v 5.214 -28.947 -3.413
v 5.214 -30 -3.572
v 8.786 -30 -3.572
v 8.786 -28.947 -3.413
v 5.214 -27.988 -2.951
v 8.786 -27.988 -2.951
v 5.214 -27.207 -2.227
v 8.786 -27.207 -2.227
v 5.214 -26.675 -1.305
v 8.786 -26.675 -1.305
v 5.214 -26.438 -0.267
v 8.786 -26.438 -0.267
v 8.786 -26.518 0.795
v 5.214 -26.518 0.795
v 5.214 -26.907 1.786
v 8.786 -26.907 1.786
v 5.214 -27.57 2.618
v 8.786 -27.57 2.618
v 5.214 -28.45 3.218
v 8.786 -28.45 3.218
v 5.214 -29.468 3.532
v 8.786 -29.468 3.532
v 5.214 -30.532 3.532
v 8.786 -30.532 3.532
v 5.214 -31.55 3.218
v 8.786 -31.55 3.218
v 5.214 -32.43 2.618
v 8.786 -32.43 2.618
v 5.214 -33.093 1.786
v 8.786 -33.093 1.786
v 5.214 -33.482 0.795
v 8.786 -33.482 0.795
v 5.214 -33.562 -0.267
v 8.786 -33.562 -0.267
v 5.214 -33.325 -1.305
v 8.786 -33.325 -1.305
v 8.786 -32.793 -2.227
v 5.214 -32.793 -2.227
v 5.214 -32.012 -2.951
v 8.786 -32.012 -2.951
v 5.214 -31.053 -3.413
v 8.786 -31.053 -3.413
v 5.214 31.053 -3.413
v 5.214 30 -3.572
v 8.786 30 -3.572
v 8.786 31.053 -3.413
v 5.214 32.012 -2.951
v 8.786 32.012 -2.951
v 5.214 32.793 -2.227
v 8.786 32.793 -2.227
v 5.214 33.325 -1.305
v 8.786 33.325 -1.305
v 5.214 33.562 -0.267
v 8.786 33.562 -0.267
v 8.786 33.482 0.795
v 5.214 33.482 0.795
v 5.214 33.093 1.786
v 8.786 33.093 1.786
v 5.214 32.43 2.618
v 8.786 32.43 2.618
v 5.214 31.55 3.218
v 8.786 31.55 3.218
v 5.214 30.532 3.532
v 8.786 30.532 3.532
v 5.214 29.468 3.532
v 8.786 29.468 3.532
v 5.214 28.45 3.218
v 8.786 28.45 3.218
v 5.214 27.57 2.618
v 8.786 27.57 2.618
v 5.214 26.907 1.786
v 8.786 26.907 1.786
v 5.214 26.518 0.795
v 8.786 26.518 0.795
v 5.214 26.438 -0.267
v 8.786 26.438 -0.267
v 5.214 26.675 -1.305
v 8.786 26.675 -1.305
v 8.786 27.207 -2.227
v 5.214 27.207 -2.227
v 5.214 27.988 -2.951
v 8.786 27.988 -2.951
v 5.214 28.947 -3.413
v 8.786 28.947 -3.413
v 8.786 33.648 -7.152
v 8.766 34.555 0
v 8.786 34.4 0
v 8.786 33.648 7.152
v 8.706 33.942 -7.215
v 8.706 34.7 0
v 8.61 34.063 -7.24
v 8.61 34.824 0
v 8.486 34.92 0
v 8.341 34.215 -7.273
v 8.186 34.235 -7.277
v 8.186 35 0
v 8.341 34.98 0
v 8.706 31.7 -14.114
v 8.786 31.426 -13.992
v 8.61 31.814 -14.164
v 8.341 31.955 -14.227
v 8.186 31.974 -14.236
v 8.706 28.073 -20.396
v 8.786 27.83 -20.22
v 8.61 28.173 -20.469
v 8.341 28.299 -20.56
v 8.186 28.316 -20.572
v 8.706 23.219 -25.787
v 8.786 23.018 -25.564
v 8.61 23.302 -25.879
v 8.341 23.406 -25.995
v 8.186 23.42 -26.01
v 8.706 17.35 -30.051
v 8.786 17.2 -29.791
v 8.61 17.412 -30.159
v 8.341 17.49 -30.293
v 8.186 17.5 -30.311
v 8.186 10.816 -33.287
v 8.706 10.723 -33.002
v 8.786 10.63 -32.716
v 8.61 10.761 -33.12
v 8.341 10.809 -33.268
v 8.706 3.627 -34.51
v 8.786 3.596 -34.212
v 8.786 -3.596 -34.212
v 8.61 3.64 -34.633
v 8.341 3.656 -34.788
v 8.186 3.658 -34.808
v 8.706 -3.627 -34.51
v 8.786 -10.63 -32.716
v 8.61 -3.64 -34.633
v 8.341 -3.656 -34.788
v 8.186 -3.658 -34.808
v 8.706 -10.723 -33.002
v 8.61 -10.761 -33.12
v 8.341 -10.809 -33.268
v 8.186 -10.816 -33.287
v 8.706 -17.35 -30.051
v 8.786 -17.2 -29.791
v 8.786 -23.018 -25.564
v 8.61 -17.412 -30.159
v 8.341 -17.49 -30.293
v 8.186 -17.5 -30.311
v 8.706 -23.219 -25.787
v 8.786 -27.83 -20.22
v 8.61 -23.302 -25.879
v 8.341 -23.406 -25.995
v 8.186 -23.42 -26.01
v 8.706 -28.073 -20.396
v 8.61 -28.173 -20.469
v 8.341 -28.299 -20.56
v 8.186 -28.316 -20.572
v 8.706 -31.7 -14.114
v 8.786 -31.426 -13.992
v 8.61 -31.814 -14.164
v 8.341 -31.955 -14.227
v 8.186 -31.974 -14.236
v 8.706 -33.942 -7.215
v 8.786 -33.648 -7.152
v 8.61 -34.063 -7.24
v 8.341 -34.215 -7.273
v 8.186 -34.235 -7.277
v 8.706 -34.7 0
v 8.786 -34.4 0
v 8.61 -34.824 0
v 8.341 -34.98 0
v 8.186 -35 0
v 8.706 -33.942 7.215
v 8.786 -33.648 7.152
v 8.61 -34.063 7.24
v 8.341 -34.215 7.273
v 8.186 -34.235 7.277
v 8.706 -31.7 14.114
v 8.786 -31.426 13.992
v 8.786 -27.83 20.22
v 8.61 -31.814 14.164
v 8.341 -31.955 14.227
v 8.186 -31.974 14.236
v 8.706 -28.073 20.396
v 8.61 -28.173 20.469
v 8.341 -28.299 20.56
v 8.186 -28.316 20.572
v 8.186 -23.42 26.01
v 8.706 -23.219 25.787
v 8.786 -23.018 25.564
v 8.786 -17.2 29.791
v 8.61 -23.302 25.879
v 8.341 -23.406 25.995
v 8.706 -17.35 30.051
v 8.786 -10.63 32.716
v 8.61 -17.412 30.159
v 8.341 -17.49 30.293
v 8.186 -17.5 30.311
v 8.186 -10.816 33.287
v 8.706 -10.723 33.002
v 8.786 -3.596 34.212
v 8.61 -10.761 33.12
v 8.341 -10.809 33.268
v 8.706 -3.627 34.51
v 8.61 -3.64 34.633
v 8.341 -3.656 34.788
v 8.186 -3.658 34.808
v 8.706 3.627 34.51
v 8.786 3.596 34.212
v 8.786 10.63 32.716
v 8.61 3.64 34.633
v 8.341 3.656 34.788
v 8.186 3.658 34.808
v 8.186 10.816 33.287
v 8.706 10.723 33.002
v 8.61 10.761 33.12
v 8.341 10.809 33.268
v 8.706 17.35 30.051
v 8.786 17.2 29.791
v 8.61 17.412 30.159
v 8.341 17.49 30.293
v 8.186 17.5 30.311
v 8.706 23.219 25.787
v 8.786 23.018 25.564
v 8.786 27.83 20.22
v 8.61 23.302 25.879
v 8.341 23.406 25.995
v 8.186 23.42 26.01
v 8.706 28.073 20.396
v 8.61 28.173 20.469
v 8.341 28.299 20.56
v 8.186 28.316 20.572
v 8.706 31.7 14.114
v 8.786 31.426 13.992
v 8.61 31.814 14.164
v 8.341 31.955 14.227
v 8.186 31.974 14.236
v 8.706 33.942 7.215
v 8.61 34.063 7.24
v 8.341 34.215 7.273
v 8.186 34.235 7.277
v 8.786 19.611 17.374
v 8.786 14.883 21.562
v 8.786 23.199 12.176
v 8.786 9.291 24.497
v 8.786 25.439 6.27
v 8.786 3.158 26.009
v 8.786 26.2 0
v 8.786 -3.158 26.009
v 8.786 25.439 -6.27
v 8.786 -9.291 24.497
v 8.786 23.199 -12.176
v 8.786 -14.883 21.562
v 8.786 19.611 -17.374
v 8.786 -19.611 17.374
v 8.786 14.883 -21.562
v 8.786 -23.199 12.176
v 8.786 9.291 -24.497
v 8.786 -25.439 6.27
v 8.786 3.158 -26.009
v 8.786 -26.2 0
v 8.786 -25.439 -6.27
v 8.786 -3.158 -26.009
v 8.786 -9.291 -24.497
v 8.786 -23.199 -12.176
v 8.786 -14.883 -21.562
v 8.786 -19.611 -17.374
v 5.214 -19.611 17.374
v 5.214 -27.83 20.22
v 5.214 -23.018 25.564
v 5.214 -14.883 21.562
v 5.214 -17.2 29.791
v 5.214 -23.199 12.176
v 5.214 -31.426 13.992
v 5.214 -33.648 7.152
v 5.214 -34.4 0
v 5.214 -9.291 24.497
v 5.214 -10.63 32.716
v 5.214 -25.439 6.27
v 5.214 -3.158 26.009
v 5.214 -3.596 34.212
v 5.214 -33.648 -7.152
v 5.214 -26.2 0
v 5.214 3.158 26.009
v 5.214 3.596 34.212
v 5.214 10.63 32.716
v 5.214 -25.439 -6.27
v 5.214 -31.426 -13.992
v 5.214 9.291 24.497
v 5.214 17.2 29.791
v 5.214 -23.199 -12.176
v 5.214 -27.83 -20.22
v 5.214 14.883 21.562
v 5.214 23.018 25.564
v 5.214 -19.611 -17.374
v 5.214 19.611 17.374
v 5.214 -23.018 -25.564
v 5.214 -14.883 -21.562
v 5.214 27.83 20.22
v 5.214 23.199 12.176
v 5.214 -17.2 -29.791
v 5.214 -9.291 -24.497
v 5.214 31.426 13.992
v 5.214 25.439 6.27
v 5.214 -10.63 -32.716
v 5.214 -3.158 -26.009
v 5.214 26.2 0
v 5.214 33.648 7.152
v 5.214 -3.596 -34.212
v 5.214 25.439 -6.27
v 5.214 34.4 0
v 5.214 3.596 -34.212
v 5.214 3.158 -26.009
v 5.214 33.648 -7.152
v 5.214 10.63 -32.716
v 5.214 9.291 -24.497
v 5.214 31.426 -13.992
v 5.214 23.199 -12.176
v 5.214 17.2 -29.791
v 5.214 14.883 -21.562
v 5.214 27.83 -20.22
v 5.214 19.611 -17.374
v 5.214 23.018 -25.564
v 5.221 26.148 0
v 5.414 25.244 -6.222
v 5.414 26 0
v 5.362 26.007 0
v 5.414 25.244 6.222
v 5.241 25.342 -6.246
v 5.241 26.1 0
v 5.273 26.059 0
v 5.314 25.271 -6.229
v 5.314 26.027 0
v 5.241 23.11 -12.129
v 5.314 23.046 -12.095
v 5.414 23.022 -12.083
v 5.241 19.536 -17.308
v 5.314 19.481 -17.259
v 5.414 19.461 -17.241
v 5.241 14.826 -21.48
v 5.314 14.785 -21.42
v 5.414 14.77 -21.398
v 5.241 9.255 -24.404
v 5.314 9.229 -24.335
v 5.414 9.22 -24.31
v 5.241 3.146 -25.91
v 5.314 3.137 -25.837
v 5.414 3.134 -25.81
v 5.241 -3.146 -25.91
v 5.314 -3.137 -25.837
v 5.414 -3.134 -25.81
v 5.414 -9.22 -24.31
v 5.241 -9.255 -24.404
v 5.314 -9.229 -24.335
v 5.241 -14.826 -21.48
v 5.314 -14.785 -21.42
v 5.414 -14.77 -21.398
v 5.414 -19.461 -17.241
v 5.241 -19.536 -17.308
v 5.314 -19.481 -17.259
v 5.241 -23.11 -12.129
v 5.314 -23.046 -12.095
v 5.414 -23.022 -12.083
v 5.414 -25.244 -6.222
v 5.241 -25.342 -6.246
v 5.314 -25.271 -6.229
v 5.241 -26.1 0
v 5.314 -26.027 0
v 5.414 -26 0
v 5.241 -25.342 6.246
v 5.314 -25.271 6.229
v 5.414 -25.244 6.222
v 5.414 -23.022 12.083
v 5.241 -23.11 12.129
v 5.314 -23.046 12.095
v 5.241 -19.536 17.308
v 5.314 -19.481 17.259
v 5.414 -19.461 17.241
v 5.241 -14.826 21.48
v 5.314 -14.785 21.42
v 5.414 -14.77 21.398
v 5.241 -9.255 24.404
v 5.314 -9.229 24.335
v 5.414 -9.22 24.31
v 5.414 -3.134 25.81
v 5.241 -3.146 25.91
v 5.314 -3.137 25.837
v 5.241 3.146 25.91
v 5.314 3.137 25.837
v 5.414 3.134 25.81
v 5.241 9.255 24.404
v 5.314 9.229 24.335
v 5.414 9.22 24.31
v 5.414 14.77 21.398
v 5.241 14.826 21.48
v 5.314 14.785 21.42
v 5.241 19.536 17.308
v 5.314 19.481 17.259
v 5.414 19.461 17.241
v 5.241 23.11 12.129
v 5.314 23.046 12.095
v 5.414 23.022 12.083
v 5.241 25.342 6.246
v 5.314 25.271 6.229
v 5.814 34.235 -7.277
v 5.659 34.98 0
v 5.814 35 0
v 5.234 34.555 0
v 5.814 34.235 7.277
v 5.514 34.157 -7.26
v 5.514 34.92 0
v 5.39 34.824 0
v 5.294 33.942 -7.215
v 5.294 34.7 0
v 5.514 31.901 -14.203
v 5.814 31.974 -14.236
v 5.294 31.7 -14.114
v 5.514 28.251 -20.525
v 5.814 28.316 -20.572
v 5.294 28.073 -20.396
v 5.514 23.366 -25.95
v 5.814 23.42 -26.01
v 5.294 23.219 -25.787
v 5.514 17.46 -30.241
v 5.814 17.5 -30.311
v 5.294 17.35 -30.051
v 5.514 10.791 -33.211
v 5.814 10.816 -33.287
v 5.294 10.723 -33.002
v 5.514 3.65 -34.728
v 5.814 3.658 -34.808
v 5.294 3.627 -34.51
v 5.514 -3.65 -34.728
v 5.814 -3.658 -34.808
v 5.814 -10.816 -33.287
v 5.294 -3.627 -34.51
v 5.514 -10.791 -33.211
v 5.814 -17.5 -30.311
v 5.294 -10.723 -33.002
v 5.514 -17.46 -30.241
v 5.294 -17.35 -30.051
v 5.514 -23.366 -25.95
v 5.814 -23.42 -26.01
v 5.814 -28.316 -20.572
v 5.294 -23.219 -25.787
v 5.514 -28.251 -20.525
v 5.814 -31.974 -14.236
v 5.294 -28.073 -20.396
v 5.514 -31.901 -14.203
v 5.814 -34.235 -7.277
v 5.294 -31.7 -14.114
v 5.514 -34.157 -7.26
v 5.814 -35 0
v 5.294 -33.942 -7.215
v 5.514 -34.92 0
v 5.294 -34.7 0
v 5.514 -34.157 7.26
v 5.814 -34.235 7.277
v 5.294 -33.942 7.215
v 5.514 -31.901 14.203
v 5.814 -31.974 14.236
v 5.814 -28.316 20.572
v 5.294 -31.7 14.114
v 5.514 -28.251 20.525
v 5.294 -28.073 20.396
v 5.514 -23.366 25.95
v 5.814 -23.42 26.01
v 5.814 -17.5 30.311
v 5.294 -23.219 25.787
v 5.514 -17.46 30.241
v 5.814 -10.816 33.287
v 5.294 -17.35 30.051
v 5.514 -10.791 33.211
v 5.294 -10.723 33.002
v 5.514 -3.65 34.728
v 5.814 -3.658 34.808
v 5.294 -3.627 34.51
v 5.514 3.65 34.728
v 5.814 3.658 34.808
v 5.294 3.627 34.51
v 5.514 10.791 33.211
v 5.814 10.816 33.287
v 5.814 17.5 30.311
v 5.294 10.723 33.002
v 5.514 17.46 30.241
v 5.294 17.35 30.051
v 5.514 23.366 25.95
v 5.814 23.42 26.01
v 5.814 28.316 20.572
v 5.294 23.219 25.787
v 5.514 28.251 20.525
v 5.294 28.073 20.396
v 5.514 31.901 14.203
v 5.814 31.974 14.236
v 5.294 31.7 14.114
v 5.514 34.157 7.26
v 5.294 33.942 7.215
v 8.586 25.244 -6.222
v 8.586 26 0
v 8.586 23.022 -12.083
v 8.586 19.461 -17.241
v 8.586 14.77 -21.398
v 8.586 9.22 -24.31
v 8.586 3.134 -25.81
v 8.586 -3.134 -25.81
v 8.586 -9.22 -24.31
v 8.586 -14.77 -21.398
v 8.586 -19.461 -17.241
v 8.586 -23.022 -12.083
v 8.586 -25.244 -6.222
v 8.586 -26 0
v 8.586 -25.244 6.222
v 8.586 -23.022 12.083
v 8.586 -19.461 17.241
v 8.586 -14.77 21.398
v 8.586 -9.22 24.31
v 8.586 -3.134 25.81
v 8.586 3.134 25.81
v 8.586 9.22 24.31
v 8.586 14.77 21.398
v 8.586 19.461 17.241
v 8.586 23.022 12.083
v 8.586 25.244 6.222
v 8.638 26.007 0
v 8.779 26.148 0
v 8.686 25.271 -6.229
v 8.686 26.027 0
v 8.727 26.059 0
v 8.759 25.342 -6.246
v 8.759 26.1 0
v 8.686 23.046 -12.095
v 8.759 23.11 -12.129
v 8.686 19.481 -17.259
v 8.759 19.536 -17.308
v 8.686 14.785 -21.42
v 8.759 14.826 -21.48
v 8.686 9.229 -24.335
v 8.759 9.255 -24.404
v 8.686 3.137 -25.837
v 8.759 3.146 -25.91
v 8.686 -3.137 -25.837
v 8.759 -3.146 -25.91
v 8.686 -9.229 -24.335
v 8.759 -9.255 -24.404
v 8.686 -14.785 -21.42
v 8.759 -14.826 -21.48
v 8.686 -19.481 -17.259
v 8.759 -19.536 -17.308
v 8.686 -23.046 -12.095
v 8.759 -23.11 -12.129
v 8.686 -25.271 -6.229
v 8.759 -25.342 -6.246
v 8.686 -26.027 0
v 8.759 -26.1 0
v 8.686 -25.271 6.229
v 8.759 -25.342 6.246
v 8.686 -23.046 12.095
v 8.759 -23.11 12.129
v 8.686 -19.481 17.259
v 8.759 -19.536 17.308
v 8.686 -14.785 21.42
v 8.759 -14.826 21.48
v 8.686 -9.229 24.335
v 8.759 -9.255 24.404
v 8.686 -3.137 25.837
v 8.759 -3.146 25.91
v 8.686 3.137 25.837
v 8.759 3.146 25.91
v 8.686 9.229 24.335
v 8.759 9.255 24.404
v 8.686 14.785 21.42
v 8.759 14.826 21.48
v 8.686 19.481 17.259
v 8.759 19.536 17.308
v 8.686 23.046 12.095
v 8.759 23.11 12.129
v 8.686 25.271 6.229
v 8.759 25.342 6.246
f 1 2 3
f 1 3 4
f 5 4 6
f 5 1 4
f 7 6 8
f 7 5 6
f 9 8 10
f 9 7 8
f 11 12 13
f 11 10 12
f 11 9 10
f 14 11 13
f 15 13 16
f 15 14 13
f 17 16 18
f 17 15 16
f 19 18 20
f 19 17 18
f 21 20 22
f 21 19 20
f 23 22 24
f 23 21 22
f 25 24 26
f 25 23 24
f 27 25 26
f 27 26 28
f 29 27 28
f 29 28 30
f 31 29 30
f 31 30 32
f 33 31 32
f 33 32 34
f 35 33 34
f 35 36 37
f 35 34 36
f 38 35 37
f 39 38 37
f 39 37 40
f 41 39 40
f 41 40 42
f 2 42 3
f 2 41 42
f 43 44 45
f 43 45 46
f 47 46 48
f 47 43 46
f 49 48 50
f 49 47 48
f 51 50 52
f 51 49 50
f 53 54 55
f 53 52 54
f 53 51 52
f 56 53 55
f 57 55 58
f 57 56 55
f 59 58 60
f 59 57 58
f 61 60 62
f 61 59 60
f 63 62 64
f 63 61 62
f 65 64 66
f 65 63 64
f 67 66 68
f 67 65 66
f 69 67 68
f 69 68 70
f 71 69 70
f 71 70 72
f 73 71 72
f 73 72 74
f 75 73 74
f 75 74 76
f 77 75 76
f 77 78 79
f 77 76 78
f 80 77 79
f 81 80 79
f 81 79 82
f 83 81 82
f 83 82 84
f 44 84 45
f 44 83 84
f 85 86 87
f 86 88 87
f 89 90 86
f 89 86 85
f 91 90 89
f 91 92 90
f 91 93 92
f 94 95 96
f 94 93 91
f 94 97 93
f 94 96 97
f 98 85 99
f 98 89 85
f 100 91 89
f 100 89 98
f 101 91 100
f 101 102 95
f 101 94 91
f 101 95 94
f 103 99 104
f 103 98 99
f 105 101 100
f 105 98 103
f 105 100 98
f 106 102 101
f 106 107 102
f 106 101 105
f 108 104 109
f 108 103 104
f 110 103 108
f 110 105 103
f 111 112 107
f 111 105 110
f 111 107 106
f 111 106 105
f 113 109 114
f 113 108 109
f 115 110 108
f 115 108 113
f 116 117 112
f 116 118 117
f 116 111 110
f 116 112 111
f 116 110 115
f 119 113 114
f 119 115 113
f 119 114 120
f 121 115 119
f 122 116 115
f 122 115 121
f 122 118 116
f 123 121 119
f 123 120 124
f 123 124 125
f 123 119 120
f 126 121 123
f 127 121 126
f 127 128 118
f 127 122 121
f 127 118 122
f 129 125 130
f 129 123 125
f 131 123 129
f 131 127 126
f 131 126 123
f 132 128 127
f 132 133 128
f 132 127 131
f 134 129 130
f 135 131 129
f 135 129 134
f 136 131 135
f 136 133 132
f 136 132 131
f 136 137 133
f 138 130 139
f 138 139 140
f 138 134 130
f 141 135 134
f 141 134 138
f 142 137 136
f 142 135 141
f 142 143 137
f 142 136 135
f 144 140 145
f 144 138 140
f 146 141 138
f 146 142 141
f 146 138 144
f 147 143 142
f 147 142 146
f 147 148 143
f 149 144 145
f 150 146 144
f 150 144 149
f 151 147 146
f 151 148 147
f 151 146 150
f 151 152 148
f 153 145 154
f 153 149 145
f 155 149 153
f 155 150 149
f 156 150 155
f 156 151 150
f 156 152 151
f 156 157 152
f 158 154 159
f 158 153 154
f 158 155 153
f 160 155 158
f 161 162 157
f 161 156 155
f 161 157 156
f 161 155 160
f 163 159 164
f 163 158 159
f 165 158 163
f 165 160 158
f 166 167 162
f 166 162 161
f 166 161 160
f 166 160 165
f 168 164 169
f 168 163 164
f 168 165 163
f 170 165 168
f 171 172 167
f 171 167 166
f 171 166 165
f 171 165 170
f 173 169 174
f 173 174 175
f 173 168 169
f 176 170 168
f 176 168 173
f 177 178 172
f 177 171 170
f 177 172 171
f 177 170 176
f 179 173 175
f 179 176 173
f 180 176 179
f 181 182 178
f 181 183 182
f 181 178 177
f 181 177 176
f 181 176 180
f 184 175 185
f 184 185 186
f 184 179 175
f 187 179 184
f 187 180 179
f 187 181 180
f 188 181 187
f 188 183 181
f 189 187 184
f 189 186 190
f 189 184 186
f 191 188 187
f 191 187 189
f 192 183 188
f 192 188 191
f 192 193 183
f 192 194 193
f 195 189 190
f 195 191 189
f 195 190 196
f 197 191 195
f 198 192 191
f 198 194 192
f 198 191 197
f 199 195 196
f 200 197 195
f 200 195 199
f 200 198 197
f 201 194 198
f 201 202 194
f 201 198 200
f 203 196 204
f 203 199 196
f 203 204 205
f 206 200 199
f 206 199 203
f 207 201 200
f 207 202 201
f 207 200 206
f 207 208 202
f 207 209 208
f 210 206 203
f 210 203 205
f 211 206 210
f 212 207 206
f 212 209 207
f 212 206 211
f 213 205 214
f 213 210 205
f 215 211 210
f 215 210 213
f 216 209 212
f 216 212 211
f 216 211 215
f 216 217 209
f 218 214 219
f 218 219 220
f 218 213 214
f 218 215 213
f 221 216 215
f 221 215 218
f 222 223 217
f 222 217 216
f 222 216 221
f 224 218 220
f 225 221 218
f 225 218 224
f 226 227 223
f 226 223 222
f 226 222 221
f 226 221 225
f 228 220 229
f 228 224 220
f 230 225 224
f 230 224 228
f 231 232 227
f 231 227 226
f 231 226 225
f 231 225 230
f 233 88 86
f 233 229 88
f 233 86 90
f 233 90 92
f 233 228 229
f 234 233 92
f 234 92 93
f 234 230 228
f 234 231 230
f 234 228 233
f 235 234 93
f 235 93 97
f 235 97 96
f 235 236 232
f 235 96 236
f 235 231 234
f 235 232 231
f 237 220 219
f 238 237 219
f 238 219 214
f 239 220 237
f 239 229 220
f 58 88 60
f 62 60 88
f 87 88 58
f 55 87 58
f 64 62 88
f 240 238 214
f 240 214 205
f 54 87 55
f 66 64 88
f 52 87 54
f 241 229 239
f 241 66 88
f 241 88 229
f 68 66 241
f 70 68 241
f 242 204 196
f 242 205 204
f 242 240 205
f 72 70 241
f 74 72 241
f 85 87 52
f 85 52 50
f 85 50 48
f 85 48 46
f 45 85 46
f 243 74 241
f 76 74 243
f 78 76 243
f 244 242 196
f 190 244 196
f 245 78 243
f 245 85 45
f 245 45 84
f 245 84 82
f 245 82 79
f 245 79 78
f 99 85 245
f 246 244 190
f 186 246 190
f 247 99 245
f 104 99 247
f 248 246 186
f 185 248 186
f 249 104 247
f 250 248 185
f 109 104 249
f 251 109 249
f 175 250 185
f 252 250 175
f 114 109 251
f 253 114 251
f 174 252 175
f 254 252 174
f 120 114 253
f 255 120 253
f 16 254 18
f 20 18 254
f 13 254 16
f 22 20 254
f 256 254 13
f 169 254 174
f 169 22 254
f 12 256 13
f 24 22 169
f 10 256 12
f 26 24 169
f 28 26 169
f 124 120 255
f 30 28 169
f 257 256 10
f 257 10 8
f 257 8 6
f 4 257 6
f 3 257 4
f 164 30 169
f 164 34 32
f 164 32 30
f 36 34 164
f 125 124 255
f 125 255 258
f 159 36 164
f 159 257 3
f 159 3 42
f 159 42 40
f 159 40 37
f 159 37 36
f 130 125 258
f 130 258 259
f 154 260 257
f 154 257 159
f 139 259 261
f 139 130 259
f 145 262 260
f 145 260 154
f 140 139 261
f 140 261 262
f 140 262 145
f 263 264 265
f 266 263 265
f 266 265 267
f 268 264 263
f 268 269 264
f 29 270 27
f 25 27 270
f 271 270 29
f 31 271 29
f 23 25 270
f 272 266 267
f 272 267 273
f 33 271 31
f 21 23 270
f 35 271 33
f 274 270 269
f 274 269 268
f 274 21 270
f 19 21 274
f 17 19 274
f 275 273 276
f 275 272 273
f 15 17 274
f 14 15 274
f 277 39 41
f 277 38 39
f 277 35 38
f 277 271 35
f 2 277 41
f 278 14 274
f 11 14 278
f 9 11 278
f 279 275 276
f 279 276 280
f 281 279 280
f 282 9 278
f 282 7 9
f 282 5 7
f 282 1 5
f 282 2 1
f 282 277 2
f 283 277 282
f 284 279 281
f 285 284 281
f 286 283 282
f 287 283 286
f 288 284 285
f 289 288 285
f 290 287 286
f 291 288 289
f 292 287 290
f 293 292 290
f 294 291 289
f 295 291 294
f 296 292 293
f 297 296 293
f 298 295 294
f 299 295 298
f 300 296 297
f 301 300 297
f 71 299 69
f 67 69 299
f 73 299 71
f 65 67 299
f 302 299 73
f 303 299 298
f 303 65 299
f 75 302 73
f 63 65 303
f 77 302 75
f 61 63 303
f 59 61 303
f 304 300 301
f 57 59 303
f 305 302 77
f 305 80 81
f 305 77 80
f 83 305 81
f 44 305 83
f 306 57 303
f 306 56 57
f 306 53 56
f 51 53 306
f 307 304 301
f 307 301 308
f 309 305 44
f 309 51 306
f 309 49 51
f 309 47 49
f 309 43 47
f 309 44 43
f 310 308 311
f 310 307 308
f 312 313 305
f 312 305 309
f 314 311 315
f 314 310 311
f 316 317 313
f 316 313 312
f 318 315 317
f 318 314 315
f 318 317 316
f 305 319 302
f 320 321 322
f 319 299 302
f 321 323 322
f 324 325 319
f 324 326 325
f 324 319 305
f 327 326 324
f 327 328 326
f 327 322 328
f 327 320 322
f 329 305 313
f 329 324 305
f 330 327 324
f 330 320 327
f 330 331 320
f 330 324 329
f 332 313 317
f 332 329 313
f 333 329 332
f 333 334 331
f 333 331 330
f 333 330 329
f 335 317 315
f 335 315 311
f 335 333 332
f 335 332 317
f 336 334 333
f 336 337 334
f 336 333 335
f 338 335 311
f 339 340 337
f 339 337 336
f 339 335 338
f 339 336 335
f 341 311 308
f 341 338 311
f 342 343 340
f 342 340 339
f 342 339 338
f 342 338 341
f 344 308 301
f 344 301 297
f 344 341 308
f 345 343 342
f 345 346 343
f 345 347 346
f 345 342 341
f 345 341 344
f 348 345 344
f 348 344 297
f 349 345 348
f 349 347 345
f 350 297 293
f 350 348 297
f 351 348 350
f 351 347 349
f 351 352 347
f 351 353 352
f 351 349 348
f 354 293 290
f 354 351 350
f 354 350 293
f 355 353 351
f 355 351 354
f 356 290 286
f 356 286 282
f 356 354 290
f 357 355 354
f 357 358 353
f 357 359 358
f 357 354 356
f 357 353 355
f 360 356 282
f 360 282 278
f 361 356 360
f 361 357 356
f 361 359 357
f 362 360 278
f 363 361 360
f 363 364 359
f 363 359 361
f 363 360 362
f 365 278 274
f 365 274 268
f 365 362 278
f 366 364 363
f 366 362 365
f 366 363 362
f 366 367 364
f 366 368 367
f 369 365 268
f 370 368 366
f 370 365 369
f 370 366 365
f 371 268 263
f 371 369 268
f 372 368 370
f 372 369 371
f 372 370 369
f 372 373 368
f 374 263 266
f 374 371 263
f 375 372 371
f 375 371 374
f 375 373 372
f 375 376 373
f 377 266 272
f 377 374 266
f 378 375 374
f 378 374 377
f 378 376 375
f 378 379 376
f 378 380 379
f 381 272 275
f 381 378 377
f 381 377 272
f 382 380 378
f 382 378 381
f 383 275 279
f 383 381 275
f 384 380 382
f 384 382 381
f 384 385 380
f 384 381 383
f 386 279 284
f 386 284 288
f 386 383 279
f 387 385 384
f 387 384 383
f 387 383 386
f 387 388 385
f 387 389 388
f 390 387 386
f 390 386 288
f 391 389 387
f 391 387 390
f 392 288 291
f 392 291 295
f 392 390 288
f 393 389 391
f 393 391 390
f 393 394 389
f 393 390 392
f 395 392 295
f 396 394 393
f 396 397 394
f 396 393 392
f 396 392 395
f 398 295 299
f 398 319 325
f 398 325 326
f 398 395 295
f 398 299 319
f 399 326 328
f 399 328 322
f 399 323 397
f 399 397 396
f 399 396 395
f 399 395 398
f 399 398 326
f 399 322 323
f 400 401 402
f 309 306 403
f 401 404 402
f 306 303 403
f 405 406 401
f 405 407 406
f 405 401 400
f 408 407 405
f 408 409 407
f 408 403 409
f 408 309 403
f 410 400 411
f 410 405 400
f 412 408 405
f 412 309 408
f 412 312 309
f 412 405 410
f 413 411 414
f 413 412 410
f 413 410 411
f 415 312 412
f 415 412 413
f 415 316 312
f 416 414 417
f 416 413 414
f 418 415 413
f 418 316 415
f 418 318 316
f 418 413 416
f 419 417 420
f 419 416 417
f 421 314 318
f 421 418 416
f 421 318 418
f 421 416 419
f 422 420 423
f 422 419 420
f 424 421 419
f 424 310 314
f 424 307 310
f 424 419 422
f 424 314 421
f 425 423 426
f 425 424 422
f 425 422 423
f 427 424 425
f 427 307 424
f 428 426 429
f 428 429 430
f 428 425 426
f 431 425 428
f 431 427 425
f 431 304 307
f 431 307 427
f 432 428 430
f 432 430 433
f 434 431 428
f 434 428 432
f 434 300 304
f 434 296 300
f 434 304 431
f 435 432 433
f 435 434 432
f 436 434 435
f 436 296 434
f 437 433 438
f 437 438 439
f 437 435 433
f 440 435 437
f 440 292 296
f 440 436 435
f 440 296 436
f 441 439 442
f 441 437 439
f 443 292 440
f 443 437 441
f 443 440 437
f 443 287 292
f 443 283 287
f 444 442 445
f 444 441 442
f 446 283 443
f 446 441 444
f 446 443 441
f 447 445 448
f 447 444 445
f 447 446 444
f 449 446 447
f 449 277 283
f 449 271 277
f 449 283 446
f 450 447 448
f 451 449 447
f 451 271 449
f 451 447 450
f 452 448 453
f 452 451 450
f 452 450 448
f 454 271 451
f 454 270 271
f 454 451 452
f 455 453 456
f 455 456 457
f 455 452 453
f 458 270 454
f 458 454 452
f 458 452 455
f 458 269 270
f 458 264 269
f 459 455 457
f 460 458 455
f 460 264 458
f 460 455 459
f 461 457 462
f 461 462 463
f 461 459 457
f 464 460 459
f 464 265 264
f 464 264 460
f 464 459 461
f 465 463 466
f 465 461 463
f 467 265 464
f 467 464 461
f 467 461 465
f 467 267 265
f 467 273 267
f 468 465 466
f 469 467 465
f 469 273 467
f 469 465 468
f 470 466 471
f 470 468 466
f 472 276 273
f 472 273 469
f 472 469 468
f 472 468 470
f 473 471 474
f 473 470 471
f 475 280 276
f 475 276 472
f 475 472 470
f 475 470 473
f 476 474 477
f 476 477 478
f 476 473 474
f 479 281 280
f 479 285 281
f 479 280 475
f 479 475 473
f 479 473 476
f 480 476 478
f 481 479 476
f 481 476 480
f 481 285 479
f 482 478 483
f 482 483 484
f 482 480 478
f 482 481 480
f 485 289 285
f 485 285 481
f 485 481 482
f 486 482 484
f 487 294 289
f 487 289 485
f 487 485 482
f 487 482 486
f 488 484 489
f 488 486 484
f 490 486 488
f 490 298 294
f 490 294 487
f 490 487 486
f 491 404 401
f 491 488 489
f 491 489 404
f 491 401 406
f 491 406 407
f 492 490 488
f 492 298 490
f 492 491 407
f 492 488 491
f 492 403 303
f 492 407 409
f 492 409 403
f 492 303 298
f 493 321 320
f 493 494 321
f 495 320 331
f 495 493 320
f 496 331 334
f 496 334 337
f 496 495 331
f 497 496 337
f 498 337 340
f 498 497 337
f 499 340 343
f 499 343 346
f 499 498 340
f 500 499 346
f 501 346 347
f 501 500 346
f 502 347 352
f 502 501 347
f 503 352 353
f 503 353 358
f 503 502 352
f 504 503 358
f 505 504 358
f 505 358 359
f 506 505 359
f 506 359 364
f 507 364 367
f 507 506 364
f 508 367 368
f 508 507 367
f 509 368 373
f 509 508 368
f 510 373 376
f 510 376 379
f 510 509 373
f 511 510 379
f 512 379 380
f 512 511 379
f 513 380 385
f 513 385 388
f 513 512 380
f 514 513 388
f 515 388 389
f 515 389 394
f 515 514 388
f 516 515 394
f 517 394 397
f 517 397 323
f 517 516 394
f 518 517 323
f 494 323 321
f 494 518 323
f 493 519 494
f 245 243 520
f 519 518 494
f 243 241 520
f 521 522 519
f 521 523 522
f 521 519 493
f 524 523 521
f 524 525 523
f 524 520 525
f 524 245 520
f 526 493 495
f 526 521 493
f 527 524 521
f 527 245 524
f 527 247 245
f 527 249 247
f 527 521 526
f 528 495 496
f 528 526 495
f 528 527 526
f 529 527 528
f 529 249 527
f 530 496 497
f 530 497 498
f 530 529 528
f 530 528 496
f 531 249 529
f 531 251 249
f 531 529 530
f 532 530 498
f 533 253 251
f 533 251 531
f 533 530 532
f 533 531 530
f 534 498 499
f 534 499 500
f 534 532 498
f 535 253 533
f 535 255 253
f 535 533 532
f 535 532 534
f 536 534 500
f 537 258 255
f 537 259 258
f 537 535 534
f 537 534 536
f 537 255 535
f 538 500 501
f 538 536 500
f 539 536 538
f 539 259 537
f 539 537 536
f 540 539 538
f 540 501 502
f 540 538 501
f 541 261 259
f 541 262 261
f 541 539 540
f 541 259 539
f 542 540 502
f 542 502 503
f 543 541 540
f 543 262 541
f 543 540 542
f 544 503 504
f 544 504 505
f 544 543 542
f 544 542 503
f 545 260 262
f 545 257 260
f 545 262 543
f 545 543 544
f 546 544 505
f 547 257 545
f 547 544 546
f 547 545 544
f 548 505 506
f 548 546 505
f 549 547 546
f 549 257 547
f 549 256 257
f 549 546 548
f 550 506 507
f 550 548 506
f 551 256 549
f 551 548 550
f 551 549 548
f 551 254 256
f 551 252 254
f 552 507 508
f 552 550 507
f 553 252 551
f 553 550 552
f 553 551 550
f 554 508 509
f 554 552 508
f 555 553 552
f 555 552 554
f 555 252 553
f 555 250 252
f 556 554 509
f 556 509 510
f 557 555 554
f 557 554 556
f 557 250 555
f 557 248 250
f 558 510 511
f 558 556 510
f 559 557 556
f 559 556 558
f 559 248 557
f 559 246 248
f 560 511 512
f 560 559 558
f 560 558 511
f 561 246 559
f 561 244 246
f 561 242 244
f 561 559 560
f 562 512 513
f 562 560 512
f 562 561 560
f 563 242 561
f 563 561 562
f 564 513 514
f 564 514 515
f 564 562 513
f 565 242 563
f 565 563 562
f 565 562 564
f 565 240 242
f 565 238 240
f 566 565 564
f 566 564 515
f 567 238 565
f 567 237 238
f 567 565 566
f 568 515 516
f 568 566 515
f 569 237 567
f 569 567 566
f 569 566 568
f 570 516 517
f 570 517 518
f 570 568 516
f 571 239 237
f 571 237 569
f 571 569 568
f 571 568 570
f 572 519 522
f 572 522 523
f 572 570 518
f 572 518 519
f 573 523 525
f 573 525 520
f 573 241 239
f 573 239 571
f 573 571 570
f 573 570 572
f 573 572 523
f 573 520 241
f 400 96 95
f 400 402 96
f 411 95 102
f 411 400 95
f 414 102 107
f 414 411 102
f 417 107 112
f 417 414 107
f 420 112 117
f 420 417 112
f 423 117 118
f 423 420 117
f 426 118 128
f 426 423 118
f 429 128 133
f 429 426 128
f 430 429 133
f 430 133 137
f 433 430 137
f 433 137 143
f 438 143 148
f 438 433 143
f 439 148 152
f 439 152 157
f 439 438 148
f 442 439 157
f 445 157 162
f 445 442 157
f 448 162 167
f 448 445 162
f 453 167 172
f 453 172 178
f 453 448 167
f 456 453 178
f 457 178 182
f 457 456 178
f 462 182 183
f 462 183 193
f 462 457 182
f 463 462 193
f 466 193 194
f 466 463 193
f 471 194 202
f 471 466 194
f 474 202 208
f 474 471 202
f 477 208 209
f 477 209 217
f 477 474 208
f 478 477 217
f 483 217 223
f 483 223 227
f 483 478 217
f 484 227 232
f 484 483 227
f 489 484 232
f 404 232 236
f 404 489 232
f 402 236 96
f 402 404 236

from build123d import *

# Parameters (mm, degrees)
CROQUIS2_R     = 3.572
EXTRUIR1_DEPTH = 12.358
CROQUIS3_R     = 3.572
EXTRUIR2_DEPTH = 12.358


with BuildPart() as part:
    # Croquis1 → Revolución1 (revolve)
    with BuildSketch(Plane.XY):
        with BuildLine():
            Line((5.214, 34.4), (5.214, 26.2))
            ThreePointArc((5.214, 26.2), (5.272578644, 26.058578644), (5.414, 26))
            Line((5.414, 26), (8.586, 26))
            ThreePointArc((8.586, 26), (8.727421356, 26.058578644), (8.786, 26.2))
            Line((8.786, 26.2), (8.786, 34.4))
            ThreePointArc((8.786, 34.4), (8.610264069, 34.824264069), (8.186, 35))
            Line((8.186, 35), (5.814, 35))
            ThreePointArc((5.814, 35), (5.389735931, 34.824264069), (5.214, 34.4))
        make_face()
    revolve(axis=Axis((50, 0, 0), (-1, 0, 0)))

    # Croquis2 → Extruir1 (cut)
    with BuildSketch(Plane(origin=(0, 0, 0), x_dir=(0, 0, -1), z_dir=(1, 0, 0))):
        with Locations((0, 30)):
            Circle(CROQUIS2_R)
    extrude(amount=EXTRUIR1_DEPTH, mode=Mode.SUBTRACT)

    # Croquis3 → Extruir2 (cut)
    with BuildSketch(Plane(origin=(0, 0, 0), x_dir=(0, 0, -1), z_dir=(1, 0, 0))):
        with Locations((0, -30)):
            Circle(CROQUIS3_R)
    extrude(amount=EXTRUIR2_DEPTH, mode=Mode.SUBTRACT)


solid = part.part
